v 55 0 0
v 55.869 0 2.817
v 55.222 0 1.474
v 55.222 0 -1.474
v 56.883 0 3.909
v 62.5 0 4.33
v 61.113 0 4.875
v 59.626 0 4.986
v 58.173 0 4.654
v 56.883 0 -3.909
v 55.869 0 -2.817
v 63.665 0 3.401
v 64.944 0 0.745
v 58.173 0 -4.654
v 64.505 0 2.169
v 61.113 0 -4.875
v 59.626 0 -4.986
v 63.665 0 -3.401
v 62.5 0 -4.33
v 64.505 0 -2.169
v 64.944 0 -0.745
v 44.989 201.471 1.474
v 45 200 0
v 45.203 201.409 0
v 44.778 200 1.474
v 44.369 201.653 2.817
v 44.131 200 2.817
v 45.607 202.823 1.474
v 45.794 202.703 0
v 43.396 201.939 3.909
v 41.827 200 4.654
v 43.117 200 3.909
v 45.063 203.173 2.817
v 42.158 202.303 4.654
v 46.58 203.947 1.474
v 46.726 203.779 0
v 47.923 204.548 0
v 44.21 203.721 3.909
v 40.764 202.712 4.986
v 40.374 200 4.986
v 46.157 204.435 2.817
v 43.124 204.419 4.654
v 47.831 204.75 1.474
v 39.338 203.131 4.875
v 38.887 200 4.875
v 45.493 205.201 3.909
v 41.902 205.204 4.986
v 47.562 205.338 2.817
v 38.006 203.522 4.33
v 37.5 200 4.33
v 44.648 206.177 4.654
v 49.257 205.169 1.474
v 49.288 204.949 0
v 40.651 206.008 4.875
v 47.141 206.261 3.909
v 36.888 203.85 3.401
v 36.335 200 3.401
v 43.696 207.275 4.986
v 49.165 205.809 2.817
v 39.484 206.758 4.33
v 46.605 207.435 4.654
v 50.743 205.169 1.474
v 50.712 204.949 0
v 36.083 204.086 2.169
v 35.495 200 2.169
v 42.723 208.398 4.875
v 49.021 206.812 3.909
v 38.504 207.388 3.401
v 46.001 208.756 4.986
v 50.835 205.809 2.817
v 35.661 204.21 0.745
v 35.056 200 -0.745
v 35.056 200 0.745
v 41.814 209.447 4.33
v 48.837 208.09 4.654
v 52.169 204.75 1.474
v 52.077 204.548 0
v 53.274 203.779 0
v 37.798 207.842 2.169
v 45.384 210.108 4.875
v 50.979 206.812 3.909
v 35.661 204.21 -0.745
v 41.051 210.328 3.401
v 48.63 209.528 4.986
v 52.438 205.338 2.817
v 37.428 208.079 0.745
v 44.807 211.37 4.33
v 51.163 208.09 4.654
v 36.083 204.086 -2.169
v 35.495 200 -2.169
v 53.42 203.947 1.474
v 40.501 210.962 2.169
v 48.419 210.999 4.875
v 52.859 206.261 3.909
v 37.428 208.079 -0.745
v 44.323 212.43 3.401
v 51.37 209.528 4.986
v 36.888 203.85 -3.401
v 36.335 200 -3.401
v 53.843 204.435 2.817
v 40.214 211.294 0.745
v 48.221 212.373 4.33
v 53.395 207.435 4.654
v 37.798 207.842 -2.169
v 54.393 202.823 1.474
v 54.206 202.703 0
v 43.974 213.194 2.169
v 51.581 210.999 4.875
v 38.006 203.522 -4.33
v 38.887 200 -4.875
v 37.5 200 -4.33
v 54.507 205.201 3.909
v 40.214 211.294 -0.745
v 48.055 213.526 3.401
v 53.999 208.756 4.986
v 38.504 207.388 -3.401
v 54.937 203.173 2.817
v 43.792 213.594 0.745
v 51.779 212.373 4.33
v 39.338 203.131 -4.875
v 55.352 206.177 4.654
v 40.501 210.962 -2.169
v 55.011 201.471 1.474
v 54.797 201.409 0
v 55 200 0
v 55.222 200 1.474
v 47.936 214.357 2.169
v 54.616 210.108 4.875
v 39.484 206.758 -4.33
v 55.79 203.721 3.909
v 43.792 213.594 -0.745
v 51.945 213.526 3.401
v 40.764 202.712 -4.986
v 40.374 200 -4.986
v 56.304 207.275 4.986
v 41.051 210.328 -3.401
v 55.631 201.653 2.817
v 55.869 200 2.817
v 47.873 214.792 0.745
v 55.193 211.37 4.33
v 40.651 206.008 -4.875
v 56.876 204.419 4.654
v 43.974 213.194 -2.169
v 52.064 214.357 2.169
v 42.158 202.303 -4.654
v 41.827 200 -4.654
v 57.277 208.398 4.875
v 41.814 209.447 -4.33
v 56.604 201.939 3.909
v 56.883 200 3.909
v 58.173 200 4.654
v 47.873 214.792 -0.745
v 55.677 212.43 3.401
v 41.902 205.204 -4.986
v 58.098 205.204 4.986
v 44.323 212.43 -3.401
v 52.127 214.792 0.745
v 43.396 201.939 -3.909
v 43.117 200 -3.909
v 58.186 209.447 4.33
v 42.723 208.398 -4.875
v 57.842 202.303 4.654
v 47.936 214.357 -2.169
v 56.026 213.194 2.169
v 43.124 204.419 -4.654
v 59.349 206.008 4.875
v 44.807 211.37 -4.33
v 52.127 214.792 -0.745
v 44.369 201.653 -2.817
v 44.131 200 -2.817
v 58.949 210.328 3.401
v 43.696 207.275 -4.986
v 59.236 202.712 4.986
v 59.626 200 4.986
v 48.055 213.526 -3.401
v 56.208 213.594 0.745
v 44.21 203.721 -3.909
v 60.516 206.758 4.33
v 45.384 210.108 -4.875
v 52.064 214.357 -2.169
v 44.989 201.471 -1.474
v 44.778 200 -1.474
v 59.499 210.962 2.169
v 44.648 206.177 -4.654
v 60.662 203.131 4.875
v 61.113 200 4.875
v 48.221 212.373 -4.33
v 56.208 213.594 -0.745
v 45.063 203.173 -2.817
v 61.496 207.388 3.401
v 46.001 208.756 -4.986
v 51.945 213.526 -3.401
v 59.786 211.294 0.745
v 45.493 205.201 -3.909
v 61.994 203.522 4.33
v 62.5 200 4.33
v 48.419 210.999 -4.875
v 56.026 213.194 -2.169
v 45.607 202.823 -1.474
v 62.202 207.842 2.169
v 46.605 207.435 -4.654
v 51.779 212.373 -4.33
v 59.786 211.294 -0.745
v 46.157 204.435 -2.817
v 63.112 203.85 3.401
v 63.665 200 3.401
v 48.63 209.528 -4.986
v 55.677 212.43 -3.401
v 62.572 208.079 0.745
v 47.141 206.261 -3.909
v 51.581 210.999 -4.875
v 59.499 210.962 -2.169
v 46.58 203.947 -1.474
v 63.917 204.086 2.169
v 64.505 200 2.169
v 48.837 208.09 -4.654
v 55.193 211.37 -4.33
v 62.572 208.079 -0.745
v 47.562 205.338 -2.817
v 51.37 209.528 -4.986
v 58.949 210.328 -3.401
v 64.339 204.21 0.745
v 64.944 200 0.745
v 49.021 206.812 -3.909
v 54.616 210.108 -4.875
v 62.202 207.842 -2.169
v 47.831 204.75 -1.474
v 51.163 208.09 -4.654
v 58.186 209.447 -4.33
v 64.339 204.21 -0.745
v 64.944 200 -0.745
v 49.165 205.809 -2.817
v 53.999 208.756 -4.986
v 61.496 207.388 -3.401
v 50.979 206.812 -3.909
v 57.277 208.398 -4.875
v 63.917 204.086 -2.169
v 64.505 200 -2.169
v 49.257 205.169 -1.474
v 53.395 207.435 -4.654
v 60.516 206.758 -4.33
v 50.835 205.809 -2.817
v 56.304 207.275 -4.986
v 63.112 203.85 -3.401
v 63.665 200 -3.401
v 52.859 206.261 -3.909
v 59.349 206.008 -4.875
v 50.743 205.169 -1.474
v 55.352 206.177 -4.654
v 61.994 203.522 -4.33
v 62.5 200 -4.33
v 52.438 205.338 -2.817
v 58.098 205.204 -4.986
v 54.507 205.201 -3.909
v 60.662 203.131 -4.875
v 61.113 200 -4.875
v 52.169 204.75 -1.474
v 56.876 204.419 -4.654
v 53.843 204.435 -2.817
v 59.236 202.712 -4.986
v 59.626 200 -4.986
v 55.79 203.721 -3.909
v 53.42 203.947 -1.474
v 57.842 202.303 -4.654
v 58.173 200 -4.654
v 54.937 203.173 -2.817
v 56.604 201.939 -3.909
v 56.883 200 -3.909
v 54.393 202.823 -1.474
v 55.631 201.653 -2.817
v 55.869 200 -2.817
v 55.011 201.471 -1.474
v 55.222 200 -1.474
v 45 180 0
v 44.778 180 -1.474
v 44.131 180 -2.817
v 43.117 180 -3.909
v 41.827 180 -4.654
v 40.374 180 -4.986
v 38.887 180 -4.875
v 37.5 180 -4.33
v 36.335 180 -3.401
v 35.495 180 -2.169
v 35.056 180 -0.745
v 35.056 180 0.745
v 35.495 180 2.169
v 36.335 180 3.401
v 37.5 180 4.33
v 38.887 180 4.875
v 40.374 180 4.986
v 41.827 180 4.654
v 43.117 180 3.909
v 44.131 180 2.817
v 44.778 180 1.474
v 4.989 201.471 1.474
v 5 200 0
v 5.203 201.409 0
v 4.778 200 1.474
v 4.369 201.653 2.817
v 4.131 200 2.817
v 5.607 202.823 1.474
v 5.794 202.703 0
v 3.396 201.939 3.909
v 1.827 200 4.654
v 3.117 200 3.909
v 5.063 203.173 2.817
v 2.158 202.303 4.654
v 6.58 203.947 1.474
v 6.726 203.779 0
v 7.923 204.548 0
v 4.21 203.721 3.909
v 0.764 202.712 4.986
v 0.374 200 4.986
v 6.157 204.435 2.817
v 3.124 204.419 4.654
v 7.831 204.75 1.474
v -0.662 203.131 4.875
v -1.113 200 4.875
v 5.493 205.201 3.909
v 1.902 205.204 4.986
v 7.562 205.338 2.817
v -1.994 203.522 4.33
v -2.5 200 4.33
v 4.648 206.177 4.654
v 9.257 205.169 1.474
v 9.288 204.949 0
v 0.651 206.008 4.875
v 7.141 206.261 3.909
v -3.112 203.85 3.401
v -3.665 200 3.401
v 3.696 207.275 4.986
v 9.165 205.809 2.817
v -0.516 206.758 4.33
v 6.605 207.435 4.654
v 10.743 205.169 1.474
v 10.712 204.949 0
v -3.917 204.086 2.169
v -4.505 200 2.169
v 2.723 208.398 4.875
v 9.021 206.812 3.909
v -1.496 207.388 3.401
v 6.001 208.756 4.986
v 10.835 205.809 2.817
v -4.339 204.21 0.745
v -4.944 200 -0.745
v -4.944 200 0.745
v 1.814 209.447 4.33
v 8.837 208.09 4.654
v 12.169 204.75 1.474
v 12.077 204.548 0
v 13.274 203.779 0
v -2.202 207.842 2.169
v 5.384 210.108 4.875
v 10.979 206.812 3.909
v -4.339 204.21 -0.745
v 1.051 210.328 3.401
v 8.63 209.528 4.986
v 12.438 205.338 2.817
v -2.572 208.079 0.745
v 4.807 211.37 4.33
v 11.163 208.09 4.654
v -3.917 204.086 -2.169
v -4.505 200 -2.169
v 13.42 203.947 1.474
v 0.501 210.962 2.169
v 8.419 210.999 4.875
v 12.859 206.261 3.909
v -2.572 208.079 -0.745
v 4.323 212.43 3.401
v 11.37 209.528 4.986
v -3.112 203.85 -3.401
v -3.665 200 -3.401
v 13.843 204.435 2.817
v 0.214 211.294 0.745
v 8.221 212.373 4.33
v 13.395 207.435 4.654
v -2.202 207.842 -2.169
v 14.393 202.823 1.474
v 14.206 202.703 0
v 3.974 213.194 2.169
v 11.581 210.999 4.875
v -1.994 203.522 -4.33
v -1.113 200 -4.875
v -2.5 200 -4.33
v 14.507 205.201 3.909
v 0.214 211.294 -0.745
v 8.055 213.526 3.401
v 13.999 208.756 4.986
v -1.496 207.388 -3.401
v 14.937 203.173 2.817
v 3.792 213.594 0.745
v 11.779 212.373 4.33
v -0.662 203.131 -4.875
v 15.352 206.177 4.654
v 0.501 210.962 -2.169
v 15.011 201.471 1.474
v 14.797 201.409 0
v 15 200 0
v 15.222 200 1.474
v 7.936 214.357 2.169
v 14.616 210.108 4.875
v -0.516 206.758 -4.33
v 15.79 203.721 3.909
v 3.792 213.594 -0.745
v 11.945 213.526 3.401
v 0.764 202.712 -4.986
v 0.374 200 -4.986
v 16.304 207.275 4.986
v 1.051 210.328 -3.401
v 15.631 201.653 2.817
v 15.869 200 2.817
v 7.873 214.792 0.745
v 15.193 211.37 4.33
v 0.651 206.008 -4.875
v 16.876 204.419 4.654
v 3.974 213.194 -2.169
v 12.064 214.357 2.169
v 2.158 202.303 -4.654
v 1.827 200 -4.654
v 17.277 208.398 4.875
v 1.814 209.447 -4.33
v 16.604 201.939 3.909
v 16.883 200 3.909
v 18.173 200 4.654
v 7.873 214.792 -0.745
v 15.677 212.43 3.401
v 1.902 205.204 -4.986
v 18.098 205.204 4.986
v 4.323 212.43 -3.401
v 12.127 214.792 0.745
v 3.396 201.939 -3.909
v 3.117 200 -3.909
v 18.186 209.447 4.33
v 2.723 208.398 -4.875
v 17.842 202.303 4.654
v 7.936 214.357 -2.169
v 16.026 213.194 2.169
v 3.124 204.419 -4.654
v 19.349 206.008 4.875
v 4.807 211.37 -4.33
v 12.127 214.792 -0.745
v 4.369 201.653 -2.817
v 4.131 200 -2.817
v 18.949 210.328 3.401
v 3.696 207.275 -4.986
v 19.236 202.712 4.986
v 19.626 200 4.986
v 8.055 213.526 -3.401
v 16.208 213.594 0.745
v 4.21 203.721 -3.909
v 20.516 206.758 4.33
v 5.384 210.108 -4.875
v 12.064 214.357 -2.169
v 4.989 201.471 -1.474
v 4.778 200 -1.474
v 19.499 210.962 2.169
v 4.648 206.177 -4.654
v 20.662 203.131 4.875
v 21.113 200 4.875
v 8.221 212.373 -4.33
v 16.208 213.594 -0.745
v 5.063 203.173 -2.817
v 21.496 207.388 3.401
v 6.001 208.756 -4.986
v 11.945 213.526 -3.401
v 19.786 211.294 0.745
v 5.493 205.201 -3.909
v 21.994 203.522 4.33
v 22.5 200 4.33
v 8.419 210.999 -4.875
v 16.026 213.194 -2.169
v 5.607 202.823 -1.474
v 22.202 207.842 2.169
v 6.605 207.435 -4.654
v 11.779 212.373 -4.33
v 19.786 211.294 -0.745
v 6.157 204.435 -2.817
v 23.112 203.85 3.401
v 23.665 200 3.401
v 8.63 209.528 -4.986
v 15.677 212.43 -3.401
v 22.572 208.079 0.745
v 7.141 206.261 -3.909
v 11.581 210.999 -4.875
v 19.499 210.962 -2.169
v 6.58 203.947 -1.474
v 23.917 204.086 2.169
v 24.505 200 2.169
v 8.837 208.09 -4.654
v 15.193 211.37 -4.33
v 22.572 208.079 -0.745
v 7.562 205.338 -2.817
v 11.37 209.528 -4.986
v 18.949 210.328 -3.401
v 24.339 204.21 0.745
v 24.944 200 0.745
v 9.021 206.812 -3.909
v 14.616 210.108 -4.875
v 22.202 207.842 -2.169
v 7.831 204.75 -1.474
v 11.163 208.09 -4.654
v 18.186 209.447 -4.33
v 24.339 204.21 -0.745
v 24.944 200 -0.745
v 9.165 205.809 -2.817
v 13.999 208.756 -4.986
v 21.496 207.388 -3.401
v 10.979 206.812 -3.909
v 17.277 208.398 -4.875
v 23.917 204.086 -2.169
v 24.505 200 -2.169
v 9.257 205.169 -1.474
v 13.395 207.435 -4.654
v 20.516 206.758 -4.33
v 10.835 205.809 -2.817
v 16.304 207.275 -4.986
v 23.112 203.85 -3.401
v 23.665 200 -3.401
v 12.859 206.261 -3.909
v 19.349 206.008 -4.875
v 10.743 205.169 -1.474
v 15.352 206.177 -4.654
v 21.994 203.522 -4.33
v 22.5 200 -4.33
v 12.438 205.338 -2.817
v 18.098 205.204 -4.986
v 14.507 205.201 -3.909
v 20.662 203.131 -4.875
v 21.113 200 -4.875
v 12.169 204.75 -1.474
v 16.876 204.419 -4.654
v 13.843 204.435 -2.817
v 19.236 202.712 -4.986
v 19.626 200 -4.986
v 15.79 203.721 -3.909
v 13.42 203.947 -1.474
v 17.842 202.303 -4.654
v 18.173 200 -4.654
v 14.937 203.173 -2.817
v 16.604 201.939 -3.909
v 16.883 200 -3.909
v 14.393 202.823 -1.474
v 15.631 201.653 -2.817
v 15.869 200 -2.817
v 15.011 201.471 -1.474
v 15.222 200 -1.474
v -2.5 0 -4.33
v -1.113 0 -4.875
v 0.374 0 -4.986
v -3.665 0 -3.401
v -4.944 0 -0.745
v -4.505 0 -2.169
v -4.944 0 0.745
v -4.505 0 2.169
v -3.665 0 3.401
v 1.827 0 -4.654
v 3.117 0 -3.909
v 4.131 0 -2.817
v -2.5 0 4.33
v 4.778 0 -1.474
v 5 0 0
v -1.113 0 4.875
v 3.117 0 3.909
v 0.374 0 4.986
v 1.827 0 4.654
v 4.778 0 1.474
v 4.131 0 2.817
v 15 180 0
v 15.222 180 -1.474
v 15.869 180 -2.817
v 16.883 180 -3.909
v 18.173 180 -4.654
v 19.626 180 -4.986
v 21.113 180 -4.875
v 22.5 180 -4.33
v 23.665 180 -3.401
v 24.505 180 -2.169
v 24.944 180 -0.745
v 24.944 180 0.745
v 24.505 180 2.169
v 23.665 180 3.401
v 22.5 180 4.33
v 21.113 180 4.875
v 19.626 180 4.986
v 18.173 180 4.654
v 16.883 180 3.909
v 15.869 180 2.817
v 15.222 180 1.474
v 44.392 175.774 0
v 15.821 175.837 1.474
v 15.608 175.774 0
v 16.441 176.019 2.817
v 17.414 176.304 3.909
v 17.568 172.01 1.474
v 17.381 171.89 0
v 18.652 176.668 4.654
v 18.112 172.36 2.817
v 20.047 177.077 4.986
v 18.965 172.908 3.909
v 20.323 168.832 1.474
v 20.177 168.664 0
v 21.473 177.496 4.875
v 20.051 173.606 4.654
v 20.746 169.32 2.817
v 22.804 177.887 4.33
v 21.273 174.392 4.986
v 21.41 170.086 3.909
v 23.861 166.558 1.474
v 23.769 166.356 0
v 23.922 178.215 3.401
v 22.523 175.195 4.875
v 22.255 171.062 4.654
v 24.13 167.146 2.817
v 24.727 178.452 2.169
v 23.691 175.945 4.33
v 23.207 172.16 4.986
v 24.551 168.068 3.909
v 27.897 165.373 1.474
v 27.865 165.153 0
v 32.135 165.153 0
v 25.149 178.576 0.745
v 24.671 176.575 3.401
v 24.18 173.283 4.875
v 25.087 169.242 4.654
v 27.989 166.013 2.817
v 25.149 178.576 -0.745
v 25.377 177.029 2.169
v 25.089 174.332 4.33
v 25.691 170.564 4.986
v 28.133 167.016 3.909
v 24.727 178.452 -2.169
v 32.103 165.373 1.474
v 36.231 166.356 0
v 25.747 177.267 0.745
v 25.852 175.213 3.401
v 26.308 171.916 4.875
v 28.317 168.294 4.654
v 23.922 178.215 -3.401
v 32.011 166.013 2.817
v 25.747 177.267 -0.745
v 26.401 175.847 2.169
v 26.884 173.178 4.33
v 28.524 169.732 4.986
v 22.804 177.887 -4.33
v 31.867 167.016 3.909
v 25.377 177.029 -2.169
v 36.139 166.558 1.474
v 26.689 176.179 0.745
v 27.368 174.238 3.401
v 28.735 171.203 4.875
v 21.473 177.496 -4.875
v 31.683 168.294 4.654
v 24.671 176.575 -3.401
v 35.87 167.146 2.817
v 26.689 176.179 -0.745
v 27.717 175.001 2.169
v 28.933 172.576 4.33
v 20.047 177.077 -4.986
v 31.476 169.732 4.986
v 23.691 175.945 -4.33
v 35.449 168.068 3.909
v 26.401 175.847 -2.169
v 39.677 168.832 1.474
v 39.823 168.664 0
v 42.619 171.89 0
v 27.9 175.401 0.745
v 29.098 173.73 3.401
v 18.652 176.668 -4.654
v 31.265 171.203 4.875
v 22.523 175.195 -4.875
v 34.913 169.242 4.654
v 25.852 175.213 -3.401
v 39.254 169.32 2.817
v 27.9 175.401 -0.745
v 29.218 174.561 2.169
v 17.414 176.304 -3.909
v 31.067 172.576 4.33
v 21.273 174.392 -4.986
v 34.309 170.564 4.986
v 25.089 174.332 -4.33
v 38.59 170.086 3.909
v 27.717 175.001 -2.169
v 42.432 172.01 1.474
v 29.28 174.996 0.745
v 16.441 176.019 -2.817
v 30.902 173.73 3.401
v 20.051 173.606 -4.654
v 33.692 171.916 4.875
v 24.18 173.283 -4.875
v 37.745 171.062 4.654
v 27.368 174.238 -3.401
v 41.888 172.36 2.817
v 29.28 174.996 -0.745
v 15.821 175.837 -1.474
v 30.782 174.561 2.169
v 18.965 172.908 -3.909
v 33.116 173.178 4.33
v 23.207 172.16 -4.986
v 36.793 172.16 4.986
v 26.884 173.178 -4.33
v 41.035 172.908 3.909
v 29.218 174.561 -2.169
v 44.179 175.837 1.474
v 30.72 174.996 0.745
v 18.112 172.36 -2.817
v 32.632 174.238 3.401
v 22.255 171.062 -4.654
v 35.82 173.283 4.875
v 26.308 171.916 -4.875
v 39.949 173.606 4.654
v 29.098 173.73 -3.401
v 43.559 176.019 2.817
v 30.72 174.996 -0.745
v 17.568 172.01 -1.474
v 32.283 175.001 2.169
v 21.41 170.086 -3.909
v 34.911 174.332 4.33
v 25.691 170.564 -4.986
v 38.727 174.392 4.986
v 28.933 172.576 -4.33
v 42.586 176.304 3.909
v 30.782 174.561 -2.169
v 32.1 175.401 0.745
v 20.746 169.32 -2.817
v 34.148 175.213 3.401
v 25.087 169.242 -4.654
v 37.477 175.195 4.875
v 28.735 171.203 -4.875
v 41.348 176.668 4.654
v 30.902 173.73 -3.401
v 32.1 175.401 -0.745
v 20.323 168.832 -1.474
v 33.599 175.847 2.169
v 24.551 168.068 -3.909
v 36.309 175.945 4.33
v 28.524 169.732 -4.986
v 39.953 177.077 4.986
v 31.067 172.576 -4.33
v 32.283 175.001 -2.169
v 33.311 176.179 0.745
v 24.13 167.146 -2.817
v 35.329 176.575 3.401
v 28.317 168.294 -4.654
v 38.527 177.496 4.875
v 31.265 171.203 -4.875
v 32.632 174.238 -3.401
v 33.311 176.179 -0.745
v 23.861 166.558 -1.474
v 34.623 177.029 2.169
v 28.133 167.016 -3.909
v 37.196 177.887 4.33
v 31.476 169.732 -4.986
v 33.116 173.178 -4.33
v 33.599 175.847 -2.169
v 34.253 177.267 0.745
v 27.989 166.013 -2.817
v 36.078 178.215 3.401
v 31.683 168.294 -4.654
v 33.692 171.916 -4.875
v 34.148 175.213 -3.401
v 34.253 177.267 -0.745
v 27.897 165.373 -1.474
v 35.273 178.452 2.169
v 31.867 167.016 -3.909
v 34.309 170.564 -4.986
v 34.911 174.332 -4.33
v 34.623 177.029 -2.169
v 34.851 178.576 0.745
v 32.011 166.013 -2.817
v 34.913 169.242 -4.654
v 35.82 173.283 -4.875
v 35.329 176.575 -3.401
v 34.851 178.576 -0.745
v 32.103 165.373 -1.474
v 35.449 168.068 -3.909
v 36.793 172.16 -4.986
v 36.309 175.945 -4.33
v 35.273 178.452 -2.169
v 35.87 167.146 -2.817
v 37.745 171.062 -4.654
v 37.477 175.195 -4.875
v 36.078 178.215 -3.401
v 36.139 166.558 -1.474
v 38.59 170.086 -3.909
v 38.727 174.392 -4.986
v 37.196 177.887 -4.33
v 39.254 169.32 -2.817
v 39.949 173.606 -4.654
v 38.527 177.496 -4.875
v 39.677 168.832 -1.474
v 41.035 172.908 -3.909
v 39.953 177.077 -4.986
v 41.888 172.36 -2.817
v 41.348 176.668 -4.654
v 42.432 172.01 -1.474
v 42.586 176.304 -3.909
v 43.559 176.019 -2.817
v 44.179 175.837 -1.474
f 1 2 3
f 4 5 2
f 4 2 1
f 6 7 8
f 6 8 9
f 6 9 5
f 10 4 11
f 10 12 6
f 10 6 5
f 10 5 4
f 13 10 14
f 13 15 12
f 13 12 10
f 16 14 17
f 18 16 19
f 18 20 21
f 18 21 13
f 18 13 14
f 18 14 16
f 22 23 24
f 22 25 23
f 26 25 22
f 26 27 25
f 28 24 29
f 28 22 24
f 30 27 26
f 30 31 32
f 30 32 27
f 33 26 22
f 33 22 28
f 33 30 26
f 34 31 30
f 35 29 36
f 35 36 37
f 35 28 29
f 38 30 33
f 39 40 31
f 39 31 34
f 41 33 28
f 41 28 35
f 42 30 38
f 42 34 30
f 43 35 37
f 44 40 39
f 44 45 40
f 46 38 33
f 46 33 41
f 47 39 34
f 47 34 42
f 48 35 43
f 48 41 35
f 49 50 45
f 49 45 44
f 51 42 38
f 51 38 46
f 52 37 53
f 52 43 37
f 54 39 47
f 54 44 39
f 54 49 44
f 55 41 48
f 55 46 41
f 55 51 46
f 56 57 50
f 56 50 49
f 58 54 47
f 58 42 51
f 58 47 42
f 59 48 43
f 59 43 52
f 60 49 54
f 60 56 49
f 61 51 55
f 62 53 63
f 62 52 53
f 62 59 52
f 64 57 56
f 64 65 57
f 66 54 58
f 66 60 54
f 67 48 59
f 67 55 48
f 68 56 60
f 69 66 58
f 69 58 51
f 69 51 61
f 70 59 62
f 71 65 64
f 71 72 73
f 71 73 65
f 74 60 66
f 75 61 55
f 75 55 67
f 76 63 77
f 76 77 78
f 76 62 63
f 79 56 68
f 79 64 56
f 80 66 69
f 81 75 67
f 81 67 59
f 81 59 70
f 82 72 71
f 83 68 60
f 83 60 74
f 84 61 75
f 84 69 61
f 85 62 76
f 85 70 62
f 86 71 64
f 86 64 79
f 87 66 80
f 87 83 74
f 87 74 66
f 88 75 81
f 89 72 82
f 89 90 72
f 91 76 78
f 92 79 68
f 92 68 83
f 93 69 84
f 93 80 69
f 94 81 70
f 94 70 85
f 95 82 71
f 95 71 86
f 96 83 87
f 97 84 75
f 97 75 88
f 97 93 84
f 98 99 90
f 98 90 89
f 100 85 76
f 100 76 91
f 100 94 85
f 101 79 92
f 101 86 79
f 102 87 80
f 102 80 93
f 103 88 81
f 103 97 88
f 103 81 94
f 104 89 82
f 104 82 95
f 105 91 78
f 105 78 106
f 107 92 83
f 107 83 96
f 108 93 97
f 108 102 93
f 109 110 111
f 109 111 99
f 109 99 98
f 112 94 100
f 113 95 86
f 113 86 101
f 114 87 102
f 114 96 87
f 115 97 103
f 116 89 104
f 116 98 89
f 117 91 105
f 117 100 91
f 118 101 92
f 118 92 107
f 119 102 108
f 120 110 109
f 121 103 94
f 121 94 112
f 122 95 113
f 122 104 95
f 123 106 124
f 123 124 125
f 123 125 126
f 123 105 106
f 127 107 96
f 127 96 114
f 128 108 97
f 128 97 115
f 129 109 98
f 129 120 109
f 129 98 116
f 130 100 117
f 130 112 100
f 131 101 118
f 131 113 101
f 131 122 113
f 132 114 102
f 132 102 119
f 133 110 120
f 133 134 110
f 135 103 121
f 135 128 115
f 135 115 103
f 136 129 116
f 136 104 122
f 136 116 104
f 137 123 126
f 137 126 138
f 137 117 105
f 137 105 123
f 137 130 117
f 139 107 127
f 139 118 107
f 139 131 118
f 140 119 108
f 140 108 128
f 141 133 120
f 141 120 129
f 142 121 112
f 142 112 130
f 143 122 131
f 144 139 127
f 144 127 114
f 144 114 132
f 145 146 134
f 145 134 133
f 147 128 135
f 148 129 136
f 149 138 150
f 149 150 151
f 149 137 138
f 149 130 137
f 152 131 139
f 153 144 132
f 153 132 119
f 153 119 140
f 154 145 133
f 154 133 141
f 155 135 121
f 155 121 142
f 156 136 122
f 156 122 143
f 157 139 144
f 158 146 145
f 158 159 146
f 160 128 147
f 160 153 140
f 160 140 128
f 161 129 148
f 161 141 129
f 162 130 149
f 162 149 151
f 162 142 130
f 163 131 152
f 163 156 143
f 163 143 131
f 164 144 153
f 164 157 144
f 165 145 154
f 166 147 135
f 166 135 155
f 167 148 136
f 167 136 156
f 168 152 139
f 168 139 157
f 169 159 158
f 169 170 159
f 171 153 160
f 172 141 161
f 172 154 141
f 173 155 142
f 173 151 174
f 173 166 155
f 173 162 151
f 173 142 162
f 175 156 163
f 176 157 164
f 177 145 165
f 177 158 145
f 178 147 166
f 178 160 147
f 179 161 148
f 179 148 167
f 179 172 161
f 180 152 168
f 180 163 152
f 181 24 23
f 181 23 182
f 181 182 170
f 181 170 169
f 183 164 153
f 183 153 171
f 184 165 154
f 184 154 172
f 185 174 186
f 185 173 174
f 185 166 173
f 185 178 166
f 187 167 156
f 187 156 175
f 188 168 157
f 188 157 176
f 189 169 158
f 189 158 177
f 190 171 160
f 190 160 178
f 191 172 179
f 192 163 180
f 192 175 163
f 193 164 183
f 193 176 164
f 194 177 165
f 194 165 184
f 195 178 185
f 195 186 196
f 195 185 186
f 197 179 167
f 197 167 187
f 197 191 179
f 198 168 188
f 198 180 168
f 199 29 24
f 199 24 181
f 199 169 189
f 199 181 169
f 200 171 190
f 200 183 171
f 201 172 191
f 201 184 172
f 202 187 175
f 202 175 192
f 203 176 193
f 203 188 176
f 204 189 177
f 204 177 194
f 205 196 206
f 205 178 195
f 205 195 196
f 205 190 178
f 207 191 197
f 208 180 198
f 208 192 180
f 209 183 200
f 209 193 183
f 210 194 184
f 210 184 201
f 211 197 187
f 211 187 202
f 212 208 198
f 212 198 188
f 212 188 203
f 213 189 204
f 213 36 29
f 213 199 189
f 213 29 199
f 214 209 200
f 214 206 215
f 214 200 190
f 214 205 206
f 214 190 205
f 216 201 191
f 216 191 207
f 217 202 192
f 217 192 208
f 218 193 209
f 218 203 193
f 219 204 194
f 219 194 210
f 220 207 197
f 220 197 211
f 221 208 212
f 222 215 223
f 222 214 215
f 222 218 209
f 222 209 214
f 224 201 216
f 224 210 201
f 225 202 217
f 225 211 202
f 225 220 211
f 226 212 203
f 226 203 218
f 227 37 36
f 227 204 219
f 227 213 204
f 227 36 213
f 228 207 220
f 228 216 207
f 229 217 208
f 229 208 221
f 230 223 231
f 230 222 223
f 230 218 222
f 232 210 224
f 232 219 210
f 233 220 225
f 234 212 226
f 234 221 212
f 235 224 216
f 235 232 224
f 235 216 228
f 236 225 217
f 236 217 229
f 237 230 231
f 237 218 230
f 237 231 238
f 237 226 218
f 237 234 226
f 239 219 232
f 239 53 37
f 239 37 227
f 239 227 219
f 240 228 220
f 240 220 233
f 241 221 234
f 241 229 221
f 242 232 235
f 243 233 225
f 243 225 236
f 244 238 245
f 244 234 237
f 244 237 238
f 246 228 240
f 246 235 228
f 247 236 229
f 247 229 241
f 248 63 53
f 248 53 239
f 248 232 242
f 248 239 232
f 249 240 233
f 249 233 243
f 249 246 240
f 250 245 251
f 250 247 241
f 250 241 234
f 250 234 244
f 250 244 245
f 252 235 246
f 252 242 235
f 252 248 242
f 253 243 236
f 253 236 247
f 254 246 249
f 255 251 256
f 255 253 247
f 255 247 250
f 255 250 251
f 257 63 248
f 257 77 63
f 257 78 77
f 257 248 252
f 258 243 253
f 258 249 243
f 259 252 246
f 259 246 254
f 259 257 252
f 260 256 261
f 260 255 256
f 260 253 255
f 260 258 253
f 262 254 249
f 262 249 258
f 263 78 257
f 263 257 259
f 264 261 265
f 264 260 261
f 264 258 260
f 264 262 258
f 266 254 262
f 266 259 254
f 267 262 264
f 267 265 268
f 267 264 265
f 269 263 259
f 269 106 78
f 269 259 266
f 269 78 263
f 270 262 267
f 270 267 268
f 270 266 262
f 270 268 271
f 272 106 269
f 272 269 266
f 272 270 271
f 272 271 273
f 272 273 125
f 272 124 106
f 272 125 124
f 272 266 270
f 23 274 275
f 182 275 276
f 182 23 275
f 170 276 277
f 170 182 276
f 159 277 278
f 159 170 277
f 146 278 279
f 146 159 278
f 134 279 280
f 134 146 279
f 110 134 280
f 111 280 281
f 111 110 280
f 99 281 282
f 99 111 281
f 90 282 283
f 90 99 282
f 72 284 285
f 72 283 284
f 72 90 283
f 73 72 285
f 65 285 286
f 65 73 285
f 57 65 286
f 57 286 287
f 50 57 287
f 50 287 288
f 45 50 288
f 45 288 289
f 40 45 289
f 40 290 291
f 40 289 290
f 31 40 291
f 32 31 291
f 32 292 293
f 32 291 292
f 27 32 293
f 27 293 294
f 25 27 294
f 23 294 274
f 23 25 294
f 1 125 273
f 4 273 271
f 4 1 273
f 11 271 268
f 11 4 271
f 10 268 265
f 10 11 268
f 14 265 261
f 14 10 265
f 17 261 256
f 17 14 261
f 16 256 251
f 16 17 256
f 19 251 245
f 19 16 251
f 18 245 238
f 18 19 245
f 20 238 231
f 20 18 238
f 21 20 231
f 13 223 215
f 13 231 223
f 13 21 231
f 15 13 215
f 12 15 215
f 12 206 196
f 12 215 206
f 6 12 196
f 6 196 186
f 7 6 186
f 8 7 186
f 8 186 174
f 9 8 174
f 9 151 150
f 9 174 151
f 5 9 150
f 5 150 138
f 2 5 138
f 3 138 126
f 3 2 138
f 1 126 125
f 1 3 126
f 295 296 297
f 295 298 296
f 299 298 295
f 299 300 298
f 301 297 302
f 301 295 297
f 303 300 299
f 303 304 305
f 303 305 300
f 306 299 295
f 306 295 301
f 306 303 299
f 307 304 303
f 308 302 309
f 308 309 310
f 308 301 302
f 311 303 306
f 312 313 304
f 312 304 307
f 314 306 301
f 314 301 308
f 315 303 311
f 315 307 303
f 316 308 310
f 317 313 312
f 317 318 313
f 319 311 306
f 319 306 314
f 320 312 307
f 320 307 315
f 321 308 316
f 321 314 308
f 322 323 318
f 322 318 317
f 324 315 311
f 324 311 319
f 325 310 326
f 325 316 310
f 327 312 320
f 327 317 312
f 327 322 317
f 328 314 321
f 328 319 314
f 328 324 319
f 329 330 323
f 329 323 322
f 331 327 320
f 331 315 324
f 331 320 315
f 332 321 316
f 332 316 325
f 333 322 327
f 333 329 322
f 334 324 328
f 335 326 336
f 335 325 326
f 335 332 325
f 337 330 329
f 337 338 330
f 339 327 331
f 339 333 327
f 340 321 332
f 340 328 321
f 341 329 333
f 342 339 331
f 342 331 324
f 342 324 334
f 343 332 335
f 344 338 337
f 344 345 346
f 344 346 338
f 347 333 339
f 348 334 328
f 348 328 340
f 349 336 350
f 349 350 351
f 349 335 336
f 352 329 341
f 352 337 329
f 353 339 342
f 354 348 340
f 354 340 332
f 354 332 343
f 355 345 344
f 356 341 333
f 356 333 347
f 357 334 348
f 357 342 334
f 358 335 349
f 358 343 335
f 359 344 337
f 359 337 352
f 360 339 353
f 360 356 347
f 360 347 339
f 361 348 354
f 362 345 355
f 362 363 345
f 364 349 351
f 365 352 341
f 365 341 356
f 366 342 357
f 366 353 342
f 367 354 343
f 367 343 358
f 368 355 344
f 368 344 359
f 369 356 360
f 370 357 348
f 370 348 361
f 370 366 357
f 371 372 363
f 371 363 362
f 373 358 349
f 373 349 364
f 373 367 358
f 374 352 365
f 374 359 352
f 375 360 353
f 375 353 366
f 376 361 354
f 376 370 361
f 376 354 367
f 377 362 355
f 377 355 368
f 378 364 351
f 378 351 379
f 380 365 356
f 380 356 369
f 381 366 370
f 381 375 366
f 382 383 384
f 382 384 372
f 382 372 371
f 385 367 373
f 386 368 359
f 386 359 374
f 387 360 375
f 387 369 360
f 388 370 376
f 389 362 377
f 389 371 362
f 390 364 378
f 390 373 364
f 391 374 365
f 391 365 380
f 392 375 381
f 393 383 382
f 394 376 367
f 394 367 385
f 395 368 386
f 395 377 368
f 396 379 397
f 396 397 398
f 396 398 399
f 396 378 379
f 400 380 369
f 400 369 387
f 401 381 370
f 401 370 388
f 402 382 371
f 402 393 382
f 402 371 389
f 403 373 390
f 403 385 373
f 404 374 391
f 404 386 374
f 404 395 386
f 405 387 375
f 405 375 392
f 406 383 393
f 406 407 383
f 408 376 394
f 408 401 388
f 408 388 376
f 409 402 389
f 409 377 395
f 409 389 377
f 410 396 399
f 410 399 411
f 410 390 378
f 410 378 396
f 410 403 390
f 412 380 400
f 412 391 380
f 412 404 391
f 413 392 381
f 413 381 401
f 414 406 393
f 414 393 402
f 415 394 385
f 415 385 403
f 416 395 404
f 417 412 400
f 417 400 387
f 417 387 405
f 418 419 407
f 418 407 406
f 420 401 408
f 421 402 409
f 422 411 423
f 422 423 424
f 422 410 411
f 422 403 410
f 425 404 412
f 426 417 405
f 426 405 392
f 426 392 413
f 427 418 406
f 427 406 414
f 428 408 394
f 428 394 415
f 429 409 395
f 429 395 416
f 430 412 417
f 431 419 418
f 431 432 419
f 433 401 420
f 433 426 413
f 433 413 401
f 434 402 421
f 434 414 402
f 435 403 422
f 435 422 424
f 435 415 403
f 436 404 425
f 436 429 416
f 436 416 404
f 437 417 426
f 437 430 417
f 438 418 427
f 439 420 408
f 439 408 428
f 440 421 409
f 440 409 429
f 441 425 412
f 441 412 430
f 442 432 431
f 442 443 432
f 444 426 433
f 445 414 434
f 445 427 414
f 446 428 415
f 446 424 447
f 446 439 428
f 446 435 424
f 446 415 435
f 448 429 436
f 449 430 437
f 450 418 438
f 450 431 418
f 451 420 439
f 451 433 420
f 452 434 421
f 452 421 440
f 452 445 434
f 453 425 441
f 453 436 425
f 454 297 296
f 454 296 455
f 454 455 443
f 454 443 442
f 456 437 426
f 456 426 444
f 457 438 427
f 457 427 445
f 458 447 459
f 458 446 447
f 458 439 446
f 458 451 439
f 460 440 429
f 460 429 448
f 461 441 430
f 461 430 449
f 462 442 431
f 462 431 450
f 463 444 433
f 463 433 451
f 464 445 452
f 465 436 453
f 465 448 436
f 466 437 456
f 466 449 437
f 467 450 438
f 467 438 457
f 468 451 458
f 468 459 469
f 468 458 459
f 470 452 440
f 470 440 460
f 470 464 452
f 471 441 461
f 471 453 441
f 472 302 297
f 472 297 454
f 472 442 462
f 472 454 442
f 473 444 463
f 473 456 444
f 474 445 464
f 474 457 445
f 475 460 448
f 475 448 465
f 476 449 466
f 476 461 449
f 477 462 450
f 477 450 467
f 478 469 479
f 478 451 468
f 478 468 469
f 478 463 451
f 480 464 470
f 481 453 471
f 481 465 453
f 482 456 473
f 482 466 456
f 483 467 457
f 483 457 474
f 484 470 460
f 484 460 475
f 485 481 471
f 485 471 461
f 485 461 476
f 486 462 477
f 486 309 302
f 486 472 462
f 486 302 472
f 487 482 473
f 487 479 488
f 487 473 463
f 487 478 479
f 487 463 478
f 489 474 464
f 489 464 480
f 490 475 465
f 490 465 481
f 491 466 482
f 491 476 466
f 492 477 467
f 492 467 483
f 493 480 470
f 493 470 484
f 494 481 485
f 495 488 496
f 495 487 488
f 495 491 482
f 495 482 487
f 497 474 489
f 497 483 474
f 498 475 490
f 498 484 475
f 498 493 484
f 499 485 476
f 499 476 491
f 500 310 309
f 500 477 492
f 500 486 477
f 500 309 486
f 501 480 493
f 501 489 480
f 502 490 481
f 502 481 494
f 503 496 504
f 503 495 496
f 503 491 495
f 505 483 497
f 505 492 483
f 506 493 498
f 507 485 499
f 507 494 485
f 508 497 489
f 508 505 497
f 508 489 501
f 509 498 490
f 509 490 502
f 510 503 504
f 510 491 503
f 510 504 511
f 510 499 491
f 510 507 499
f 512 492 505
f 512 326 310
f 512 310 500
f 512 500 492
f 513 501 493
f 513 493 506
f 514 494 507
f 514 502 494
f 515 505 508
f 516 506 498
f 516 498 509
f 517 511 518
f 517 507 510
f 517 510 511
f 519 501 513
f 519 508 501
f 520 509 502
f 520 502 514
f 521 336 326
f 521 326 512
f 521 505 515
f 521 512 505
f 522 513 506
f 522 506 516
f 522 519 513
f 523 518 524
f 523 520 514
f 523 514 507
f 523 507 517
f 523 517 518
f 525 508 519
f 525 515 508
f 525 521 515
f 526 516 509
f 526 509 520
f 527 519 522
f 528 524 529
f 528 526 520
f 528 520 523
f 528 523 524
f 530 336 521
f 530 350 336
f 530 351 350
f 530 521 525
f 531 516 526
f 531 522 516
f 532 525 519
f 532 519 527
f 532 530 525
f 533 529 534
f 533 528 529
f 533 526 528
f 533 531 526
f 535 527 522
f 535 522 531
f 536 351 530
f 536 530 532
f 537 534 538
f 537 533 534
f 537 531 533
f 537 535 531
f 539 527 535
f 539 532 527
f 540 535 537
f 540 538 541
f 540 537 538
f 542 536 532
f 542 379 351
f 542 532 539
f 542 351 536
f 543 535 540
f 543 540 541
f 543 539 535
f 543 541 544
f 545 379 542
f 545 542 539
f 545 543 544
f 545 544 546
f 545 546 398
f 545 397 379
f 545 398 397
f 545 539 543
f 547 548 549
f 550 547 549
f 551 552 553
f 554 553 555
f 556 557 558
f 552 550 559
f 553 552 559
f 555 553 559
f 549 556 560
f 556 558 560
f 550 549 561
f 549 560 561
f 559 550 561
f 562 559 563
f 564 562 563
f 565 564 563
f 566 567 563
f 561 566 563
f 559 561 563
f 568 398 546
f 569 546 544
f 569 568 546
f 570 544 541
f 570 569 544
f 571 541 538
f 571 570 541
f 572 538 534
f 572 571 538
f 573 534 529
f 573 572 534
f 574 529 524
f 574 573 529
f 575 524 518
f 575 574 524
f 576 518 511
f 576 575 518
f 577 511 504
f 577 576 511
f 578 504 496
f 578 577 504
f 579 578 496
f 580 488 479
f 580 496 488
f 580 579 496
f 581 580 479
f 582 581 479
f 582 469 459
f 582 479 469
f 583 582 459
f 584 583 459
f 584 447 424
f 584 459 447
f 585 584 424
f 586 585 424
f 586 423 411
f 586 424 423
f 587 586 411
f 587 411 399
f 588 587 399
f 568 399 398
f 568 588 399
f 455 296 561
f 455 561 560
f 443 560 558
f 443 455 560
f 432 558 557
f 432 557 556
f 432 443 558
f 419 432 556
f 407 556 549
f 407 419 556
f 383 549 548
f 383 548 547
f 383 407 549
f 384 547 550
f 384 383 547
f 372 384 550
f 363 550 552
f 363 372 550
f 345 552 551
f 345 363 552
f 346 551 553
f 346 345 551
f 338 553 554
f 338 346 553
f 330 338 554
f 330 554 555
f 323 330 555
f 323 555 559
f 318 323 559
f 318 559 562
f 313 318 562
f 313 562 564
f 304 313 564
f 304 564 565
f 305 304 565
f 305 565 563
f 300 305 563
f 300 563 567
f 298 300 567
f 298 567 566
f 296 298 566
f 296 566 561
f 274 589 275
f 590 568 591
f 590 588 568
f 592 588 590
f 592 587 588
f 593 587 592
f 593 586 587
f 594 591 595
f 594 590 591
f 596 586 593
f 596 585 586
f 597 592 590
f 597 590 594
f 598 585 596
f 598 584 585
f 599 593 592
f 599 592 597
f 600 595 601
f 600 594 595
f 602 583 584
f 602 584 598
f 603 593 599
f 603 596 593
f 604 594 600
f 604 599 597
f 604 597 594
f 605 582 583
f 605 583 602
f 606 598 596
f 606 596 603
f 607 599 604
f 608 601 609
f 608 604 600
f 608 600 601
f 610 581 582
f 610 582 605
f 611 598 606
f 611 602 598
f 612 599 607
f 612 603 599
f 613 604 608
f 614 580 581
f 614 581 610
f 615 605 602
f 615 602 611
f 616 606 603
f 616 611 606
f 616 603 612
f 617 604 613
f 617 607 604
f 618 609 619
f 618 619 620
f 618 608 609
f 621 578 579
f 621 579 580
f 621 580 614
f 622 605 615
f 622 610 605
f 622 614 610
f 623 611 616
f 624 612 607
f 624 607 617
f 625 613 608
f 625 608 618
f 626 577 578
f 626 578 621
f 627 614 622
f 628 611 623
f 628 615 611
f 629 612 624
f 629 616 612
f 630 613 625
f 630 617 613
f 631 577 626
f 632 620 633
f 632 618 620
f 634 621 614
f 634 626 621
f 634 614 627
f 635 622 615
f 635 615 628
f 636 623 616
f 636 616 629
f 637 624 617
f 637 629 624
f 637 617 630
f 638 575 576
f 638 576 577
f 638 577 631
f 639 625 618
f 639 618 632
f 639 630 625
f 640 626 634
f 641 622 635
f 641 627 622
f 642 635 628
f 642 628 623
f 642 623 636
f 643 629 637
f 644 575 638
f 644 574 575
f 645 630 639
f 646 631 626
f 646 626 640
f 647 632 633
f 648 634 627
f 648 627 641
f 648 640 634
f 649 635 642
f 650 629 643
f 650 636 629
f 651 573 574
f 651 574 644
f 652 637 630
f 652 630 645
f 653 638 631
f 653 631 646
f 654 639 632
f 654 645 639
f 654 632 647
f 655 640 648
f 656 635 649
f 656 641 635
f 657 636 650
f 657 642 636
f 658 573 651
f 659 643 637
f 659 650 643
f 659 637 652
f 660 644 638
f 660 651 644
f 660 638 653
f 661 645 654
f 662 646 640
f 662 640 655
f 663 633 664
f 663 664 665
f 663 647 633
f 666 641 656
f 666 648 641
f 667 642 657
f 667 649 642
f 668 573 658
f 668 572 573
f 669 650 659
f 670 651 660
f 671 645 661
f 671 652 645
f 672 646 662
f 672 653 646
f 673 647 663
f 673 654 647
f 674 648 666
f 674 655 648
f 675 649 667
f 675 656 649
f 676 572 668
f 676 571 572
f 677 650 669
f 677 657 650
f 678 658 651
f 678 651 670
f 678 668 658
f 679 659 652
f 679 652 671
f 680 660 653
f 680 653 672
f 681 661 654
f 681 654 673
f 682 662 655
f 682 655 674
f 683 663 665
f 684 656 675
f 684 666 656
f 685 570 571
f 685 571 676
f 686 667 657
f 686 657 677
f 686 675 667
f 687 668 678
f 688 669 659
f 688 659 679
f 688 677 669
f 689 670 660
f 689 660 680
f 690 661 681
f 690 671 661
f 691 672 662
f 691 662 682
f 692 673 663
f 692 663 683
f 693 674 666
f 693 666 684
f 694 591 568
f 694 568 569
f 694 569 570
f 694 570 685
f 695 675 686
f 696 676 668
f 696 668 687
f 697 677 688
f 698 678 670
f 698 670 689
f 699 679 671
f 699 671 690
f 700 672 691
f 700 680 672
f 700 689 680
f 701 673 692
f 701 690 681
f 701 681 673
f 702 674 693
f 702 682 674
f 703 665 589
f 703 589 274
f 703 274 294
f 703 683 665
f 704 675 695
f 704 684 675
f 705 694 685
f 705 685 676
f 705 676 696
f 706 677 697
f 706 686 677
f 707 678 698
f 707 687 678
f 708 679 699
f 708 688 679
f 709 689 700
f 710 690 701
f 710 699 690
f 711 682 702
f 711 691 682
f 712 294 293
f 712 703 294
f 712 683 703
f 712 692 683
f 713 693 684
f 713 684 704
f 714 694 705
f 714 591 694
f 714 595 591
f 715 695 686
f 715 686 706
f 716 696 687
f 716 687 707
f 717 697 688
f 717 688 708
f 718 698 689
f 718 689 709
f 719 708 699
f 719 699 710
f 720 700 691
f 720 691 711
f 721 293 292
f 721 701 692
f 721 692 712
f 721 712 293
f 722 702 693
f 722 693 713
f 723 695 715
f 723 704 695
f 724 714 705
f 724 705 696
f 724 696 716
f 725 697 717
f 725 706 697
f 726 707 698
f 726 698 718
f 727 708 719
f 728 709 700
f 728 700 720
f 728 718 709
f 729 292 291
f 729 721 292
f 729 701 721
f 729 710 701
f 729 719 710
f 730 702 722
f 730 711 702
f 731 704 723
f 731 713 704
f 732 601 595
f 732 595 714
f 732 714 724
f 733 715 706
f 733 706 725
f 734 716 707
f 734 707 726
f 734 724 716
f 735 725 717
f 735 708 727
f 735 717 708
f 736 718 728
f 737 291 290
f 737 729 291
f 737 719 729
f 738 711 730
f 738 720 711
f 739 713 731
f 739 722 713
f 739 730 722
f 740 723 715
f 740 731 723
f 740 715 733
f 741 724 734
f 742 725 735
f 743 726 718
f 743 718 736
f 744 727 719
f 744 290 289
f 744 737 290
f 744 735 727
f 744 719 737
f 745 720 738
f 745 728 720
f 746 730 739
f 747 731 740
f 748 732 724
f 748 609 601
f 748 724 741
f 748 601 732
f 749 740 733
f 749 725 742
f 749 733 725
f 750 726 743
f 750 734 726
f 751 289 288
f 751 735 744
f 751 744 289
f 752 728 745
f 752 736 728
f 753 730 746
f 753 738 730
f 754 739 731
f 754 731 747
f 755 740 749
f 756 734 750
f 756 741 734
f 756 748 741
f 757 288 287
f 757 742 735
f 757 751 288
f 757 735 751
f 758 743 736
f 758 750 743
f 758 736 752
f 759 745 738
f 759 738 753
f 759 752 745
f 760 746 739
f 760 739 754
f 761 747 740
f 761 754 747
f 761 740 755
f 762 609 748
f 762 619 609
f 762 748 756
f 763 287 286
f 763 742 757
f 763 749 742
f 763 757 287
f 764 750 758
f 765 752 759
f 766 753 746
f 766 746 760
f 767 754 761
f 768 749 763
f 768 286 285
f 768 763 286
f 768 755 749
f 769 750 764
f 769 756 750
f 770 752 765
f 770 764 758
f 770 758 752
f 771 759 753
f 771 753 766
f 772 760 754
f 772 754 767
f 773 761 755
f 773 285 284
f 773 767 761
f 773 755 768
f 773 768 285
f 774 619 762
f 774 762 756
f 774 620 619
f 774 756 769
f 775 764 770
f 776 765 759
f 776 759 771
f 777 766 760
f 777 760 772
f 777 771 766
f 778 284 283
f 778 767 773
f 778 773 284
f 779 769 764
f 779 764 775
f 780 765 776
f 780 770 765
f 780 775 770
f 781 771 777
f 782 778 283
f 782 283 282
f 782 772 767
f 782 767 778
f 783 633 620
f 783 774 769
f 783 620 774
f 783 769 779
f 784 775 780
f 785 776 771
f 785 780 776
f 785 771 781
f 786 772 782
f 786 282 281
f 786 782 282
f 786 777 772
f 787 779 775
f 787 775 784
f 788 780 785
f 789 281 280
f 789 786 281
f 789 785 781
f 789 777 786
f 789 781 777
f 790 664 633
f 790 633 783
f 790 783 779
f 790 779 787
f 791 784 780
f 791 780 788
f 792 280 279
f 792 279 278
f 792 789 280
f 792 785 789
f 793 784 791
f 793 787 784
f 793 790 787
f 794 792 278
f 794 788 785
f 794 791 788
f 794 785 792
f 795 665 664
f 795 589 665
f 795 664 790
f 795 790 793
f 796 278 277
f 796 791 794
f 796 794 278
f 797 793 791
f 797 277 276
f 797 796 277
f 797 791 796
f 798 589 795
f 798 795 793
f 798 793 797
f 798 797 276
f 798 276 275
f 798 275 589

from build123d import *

# Parameters (mm, degrees)
SKETCH8_R = 5


with BuildPart() as part:
    # Sweep3: sweep along a path in Sketch1
    with BuildLine(Plane.XY) as sweep3_path:
        Line((0, 0), (0, 200))
        ThreePointArc((0, 200), (10, 210), (20, 200))
        Line((20, 200), (20, 180))
        ThreePointArc((20, 180), (30, 170), (40, 180))
        Line((40, 180), (40, 200))
        ThreePointArc((40, 200), (50, 210), (60, 200))
        Line((60, 200), (60, 0))
    # Sketch8 → Sweep3 (sweep)
    with BuildSketch(Plane(origin=(0, 0, 0), x_dir=(1, 0, 0), z_dir=(0, 1, 0))):
        Circle(SKETCH8_R)
    sweep(path=sweep3_path.line)


solid = part.part
